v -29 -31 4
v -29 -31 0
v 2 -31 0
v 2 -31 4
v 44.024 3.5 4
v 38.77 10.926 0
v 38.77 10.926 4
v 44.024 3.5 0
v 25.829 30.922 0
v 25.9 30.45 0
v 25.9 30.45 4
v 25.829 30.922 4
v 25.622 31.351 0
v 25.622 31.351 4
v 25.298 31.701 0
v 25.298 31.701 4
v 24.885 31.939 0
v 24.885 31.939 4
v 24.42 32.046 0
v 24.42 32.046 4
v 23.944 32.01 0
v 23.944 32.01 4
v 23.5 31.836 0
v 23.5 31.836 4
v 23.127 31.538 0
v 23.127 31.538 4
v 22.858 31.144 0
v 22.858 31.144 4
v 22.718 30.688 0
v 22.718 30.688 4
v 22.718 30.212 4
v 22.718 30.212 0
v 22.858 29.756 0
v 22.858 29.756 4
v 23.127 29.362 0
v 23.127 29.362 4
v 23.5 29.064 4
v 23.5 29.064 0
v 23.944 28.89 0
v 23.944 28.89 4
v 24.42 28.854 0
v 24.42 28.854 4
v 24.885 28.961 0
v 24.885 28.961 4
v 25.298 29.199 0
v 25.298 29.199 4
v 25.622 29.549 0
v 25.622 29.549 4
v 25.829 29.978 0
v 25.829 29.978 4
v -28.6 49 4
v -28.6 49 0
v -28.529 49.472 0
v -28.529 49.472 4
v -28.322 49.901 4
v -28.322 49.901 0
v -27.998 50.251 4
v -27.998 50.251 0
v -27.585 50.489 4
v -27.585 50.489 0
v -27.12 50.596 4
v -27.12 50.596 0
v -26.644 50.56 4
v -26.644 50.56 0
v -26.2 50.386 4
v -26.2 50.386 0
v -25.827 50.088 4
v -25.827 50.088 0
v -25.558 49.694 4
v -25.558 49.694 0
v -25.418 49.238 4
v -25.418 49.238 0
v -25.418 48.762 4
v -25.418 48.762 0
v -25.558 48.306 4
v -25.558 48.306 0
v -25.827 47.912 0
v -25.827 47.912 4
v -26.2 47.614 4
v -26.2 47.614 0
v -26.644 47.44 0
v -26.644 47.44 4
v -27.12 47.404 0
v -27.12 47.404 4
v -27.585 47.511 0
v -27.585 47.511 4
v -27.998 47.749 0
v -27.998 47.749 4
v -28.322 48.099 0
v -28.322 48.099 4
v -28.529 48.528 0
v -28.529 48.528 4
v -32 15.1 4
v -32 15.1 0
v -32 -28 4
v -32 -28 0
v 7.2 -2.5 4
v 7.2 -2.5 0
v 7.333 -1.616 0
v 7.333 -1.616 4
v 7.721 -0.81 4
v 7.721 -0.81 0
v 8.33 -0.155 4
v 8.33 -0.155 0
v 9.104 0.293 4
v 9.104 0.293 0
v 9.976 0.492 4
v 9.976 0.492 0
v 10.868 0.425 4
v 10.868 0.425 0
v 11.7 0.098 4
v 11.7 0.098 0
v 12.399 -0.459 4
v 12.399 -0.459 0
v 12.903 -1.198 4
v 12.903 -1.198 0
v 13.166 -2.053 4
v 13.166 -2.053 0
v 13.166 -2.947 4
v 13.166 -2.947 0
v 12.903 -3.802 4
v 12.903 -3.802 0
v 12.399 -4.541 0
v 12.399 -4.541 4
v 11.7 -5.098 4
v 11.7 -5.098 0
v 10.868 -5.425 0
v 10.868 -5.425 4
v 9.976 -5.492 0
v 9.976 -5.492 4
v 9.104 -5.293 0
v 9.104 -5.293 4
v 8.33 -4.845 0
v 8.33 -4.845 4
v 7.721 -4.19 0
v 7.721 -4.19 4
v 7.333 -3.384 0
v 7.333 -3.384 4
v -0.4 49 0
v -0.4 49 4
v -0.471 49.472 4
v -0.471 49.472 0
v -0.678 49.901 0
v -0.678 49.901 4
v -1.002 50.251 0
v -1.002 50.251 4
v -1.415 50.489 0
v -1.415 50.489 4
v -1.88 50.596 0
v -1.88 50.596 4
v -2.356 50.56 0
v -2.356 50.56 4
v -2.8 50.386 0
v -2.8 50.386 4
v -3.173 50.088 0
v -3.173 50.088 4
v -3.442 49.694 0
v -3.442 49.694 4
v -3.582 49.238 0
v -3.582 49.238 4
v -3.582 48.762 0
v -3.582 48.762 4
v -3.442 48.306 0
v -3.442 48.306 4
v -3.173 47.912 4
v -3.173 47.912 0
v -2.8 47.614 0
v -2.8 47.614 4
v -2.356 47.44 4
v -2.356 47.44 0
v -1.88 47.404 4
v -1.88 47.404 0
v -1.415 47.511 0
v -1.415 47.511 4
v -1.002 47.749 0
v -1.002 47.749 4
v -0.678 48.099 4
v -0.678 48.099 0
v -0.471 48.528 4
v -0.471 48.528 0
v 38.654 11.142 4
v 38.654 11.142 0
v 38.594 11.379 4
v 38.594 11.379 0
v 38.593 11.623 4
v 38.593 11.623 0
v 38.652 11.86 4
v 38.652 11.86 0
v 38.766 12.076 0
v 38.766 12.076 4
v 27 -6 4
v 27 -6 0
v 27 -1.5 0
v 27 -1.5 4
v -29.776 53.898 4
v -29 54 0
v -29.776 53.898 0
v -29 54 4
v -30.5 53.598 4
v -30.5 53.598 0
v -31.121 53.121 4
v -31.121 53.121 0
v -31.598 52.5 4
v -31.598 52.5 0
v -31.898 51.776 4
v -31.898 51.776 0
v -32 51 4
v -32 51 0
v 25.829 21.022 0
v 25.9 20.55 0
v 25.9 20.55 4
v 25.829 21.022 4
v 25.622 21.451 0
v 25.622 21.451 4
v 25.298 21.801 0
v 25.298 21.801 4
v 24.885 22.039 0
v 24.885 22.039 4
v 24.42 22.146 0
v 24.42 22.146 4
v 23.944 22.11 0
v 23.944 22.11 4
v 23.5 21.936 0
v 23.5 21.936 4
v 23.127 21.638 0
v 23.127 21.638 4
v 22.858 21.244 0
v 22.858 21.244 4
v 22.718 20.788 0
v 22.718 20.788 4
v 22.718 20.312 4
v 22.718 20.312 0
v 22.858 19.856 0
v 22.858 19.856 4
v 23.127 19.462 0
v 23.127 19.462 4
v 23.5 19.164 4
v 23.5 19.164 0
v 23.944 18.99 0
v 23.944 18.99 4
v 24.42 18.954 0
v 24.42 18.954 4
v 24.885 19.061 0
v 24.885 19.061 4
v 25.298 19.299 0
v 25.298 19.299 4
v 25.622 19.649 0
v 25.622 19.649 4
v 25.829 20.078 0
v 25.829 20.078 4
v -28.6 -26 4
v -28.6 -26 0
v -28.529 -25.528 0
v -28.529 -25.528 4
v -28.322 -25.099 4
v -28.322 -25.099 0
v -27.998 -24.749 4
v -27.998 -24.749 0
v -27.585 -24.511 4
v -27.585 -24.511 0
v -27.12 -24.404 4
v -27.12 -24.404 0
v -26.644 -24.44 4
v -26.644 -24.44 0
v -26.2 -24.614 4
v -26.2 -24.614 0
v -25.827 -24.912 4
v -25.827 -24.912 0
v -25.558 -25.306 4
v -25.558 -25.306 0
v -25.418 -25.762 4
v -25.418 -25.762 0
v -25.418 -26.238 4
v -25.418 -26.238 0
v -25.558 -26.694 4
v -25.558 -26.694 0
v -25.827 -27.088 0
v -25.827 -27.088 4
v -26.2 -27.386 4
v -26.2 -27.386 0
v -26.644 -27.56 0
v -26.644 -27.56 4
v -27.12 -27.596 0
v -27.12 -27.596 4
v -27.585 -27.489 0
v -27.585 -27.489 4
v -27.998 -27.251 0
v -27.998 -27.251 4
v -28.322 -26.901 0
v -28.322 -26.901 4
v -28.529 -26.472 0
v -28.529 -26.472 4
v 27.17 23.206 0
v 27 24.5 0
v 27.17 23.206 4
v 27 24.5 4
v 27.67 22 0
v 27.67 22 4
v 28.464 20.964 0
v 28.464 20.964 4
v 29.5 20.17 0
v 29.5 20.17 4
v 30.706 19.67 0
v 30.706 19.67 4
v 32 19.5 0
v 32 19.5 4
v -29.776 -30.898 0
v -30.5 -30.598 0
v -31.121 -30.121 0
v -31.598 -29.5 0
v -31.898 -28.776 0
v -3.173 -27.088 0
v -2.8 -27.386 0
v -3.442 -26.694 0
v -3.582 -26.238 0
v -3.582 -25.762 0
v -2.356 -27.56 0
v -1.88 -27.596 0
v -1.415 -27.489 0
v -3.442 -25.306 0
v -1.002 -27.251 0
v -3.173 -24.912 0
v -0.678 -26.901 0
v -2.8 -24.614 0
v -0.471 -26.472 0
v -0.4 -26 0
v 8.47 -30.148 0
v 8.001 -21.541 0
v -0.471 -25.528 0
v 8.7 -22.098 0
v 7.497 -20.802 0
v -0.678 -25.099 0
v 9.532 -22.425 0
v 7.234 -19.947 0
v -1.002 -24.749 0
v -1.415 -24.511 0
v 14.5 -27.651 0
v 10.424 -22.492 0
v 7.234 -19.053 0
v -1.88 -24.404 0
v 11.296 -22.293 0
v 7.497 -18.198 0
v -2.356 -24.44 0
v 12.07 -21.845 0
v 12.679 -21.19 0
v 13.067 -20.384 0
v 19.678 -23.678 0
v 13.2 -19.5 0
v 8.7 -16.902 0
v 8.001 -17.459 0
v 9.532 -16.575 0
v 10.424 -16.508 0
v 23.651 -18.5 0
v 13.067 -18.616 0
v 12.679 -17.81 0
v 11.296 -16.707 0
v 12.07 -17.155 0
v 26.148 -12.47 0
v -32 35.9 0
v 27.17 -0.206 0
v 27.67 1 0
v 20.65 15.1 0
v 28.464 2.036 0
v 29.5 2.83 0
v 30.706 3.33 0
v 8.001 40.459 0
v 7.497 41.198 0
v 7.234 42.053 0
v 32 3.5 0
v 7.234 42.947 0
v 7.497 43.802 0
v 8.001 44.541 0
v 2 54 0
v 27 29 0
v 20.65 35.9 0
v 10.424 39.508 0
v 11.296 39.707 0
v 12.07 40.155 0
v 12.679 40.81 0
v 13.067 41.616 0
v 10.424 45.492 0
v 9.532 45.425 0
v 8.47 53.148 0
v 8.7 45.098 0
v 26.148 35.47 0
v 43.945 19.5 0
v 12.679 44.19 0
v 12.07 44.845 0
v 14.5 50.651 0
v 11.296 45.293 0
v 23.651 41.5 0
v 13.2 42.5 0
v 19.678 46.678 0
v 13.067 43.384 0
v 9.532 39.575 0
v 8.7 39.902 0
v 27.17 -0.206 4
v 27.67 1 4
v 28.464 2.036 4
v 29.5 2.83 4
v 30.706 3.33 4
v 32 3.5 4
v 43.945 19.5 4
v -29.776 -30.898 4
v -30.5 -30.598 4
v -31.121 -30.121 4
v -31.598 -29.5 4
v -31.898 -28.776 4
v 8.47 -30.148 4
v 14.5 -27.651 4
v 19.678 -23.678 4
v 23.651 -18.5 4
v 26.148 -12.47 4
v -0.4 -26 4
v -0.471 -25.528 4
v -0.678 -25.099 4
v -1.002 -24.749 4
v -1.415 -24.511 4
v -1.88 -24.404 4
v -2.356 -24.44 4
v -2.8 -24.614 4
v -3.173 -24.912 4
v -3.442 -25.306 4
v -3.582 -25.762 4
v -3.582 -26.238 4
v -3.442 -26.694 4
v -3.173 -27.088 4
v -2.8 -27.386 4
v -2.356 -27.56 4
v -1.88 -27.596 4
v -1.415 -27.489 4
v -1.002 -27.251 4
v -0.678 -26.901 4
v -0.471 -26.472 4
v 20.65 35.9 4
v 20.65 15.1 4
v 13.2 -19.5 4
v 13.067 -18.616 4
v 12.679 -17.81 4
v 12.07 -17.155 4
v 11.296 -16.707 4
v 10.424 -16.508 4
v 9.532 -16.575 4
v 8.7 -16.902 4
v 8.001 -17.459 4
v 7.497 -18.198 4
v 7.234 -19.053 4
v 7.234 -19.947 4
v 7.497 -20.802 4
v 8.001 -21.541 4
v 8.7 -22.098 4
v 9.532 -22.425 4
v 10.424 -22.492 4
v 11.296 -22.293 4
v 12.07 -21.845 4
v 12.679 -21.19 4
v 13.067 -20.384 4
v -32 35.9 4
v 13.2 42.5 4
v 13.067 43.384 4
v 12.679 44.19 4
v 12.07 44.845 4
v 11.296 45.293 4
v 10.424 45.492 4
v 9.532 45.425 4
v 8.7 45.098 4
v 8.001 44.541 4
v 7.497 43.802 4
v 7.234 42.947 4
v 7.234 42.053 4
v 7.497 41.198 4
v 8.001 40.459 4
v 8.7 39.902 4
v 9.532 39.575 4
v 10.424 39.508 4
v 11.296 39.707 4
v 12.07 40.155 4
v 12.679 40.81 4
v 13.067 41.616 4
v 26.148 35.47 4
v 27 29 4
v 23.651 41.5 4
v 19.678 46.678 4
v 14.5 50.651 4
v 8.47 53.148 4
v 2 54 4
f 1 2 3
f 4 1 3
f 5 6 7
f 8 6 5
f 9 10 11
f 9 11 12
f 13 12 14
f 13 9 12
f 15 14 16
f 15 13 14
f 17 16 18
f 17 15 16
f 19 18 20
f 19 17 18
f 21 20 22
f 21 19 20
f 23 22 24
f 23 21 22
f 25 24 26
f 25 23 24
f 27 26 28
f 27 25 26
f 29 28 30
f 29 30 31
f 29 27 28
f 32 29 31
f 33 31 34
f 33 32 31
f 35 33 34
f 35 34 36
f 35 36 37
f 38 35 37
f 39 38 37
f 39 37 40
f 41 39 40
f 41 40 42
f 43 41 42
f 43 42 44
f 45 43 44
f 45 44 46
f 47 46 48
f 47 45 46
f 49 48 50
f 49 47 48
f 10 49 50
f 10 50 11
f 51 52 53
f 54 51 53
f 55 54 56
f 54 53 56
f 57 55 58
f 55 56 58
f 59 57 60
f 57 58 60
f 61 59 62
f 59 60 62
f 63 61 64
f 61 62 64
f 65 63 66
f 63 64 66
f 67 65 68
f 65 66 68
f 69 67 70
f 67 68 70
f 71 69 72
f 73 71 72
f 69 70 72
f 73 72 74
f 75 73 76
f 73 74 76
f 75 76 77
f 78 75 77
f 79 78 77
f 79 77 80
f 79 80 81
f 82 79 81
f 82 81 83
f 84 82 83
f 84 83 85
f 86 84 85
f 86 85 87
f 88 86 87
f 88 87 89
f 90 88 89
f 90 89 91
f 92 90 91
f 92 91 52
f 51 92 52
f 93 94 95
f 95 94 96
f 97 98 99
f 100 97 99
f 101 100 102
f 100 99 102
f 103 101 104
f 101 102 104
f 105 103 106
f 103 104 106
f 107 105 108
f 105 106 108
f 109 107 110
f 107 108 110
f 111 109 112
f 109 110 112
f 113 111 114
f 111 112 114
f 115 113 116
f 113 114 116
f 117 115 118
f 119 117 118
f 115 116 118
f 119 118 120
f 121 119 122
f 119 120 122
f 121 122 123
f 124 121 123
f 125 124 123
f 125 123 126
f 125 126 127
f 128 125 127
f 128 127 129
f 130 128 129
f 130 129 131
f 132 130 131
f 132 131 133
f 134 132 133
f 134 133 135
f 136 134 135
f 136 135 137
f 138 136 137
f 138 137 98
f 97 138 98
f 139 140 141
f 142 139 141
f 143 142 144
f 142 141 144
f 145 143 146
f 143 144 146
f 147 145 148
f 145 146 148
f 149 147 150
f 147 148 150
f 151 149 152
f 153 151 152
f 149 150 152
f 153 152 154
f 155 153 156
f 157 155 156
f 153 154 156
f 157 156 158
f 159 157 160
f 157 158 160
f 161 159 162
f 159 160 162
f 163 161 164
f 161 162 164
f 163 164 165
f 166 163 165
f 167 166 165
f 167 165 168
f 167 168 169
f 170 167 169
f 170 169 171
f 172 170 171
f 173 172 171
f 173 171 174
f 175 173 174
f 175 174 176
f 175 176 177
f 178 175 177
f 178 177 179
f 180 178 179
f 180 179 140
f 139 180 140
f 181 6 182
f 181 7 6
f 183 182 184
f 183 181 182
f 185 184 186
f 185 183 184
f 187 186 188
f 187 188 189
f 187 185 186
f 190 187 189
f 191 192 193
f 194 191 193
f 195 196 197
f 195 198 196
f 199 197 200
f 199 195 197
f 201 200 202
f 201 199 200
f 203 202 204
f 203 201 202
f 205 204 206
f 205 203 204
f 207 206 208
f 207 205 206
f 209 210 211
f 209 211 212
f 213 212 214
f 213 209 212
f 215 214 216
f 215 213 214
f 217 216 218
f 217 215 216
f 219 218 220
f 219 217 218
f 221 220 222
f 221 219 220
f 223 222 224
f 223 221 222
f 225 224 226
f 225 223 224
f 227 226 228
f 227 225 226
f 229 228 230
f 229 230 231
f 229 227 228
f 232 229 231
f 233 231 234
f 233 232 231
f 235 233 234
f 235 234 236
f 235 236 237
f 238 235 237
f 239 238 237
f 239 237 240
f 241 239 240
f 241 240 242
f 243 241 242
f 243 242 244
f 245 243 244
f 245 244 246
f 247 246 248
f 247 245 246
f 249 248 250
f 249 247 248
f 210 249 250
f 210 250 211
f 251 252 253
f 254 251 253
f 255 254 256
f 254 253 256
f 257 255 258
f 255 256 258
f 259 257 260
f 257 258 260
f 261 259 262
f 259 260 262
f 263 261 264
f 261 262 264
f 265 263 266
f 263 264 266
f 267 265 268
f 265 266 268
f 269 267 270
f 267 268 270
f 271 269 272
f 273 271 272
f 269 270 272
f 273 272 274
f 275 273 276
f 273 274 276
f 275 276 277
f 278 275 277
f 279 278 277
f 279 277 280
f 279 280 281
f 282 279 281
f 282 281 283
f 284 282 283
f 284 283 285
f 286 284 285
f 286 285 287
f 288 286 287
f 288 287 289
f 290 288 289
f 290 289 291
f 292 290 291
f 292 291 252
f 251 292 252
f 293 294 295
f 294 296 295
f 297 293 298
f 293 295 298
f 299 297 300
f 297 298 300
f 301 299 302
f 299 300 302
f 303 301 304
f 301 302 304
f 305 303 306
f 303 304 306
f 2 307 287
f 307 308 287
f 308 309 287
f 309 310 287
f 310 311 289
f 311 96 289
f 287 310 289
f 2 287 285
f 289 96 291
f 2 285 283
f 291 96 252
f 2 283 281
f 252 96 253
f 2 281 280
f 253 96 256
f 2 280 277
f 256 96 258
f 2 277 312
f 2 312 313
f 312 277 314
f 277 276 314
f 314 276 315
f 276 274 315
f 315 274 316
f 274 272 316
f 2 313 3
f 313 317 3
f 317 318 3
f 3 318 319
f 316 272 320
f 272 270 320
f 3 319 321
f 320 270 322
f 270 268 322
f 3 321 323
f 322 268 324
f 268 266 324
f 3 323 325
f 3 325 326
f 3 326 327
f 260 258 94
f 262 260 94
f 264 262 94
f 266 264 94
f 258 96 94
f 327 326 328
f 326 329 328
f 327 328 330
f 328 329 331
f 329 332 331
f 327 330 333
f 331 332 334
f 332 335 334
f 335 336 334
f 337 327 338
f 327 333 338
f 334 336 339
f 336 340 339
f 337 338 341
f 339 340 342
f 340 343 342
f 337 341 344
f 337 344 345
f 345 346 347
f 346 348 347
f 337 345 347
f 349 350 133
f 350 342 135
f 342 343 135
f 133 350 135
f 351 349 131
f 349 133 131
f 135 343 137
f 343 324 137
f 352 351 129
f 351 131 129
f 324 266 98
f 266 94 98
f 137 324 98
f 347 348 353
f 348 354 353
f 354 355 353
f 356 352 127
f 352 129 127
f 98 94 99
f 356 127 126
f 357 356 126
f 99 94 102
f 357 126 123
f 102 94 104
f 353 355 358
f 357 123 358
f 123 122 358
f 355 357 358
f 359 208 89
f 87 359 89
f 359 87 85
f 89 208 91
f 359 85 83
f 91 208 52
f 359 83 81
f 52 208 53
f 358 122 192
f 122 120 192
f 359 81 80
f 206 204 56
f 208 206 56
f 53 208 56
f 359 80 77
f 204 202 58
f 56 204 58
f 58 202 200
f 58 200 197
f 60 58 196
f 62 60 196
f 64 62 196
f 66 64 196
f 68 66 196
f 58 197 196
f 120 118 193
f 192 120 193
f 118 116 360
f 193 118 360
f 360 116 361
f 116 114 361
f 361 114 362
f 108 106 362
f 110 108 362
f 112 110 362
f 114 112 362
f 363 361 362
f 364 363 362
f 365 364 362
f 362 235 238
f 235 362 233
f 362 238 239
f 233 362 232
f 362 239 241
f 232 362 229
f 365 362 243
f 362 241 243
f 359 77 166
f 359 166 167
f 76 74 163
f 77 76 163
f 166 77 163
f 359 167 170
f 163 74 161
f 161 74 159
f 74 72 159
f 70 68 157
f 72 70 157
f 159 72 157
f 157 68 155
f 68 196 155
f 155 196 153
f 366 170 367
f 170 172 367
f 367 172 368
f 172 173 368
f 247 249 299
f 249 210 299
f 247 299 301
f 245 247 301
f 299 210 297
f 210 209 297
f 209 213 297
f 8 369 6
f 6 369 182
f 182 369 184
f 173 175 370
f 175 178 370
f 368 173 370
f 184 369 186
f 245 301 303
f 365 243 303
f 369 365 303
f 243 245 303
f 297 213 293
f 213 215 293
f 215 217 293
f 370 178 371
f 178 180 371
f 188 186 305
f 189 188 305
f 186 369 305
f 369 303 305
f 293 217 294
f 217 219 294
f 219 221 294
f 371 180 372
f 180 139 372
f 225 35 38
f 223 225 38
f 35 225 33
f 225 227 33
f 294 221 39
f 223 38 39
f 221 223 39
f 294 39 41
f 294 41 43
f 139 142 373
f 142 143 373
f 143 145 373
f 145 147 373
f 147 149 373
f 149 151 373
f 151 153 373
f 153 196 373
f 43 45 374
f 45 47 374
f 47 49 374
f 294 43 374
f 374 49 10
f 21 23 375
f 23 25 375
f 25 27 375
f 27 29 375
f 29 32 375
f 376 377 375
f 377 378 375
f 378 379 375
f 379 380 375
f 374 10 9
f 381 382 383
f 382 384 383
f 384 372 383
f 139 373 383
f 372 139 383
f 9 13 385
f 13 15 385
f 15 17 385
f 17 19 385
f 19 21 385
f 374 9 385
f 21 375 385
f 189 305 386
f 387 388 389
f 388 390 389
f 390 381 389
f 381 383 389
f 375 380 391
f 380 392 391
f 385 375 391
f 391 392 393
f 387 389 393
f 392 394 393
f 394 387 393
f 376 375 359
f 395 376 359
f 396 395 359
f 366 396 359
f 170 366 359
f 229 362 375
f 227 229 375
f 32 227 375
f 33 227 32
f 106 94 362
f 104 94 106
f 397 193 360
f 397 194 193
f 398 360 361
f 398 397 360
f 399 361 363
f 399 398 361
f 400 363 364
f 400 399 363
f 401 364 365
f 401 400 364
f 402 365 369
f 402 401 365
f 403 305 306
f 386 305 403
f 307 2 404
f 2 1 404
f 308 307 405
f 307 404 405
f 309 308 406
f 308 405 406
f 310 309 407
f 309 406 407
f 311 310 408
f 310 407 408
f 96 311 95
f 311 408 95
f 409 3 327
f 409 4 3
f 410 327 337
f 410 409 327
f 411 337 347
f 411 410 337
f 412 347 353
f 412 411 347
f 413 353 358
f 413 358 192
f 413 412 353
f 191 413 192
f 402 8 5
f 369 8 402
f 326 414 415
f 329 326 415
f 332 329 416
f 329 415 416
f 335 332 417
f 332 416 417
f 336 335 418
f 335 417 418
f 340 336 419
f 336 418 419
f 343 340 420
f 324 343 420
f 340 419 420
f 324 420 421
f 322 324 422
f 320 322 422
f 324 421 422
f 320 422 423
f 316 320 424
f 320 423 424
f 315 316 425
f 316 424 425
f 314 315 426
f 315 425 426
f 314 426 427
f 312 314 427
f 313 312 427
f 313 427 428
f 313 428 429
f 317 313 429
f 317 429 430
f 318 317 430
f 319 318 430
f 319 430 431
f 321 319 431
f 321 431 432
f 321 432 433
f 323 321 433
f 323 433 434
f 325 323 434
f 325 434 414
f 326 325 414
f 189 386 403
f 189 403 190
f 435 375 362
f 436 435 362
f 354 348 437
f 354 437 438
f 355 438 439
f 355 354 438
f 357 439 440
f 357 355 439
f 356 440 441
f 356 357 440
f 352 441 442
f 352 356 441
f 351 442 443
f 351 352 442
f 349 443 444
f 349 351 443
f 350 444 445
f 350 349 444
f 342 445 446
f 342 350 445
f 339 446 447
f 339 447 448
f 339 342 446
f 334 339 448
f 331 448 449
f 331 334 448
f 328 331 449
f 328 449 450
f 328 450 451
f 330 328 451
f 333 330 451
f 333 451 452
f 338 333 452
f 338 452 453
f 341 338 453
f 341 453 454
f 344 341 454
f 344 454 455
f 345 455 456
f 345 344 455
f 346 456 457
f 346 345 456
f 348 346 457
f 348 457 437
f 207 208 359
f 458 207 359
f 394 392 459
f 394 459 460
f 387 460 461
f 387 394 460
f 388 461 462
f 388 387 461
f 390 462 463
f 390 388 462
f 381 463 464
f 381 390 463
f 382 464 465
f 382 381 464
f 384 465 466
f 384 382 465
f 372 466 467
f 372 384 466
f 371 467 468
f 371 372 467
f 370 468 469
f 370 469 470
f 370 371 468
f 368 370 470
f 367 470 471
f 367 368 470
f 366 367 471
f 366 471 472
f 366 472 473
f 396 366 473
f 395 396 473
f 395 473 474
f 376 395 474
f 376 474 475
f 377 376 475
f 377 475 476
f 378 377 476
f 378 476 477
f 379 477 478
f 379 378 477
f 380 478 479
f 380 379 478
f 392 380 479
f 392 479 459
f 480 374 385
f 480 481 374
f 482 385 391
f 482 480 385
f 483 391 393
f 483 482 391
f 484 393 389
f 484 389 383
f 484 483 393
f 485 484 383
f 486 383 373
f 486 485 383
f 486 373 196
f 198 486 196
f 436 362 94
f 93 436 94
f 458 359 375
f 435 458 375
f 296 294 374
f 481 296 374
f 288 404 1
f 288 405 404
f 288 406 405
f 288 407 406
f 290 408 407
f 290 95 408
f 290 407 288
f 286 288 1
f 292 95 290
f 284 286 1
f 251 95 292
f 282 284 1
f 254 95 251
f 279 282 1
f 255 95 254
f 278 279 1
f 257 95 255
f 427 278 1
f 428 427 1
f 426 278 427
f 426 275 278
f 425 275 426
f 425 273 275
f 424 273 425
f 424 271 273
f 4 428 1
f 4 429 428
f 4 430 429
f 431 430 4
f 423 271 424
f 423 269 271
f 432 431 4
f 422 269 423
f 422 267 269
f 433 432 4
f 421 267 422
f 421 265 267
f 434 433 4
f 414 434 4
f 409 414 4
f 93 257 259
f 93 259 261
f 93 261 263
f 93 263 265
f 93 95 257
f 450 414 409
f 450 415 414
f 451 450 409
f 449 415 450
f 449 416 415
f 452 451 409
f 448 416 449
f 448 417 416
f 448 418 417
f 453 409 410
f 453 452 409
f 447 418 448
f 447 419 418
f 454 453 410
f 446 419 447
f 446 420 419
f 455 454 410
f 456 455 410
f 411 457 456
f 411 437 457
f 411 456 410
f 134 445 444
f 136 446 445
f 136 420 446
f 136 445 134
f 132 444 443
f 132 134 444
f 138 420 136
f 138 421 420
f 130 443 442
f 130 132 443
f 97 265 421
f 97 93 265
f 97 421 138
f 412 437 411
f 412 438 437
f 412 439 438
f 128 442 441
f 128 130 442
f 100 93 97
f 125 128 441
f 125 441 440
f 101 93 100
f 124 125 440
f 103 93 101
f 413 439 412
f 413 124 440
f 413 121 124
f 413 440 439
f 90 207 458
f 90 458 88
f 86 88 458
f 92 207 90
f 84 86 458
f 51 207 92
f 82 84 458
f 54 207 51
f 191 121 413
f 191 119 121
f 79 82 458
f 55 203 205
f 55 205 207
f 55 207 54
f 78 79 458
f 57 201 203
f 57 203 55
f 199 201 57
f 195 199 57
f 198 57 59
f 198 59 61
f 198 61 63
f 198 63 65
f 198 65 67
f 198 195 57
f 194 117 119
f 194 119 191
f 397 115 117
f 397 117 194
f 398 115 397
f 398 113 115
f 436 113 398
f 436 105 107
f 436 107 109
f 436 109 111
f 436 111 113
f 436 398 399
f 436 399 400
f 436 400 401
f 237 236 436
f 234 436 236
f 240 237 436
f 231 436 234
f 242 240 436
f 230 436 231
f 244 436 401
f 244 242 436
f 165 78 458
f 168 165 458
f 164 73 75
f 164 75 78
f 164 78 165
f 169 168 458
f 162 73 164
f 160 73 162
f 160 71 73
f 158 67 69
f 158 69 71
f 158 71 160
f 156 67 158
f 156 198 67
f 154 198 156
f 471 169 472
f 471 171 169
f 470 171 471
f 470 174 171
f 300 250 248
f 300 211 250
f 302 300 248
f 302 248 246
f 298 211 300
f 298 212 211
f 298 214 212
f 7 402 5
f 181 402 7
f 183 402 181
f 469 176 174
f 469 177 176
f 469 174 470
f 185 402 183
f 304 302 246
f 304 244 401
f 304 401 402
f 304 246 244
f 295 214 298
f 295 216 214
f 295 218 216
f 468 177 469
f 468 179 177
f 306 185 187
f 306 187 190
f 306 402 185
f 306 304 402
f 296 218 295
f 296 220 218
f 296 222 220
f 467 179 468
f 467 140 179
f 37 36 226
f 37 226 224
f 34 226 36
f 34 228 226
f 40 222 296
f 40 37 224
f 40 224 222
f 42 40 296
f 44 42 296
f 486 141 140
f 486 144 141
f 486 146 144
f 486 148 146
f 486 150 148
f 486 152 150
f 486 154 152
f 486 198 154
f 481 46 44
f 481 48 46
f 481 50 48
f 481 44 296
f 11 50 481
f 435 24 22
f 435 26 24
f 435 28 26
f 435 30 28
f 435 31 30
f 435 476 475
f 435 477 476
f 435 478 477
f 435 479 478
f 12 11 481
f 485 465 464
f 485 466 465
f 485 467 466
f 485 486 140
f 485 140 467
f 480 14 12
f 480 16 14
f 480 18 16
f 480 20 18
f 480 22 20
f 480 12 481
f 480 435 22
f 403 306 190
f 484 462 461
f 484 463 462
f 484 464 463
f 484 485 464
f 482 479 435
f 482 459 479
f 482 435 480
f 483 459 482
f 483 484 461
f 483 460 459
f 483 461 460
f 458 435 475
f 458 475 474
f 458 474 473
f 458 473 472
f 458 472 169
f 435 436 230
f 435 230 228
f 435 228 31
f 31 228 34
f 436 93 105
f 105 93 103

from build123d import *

# Parameters (mm, degrees)
SKETCH_1_R          = 3
SKETCH_1_R_2        = 1.6
EXTRUDE_1_DEPTH     = 4
FILLET_1_R          = 3
FILLET_2_R          = 25
SKETCH_2_R          = 1.6
CUT_EXTRUDE_1_DEPTH = 10
SKETCH_3_R          = 3
CUT_EXTRUDE_2_DEPTH = 10
EXTRUDE_2_DEPTH     = 4
FILLET_3_R          = 5
FILLET_4_R          = 1
SKETCH_5_R          = 1.6
CUT_EXTRUDE_3_DEPTH = 10


with BuildPart() as part:
    # ｽｹｯﾁ1 → ﾎﾞｽ - 押し出し1 (new body)
    with BuildSketch(Plane.XY):
        Polygon((-32, -10.4), (-32, -31), (27, -31), (27, 54), (-32, 54), (-32, 35.9), (20.65, 35.9), (20.65, 15.1), (-32, 15.1), (-32, 10.4), align=None)
        with Locations((10.2, -19.5)):
            Circle(SKETCH_1_R, mode=Mode.SUBTRACT)
        with Locations((24.3, 20.55)):
            Circle(SKETCH_1_R_2, mode=Mode.SUBTRACT)
        with Locations((24.3, 30.45)):
            Circle(SKETCH_1_R_2, mode=Mode.SUBTRACT)
        with Locations((10.2, 42.5)):
            Circle(SKETCH_1_R, mode=Mode.SUBTRACT)
    extrude(amount=EXTRUDE_1_DEPTH)

    # ﾌｨﾚｯﾄ1
    fillet_1_edges = [part.edges().sort_by_distance(p)[0] for p in [
        (-32, 54, 2),
        (-32, -31, 2),
    ]]
    fillet(fillet_1_edges, radius=FILLET_1_R)

    # ﾌｨﾚｯﾄ2
    fillet_2_edges = [part.edges().sort_by_distance(p)[0] for p in [
        (27, 54, 2),
        (27, -31, 2),
    ]]
    fillet(fillet_2_edges, radius=FILLET_2_R)

    # ｽｹｯﾁ2 → ｶｯﾄ - 押し出し1 (cut)
    with BuildSketch(Plane(origin=(0, 0, 0), x_dir=(-1, 0, 0), z_dir=(0, 0, -1))):
        with Locations((27, 49)):
            Circle(SKETCH_2_R)
        with Locations((27, -26)):
            Circle(SKETCH_2_R)
    extrude(amount=-CUT_EXTRUDE_1_DEPTH, mode=Mode.SUBTRACT)

    # ｽｹｯﾁ3 → ｶｯﾄ - 押し出し2 (cut)
    with BuildSketch(Plane(origin=(0, 0, 0), x_dir=(-1, 0, 0), z_dir=(0, 0, -1))):
        with Locations((-10.2, -2.5)):
            Circle(SKETCH_3_R)
    extrude(amount=-CUT_EXTRUDE_2_DEPTH, mode=Mode.SUBTRACT)

    # ｽｹｯﾁ4 → ﾎﾞｽ - 押し出し2 (add)
    with BuildSketch(Plane(origin=(0, 0, 0), x_dir=(-1, 0, 0), z_dir=(0, 0, -1))):
        Polygon((-27, 19.5), (-43.945270358, 19.5), (-38.364198183, 11.5), (-44.023561215, 3.5), (-27, 3.5), align=None)
    extrude(amount=-EXTRUDE_2_DEPTH)

    # ﾌｨﾚｯﾄ3
    fillet_3_edges = [part.edges().sort_by_distance(p)[0] for p in [
        (27, 19.5, 2),
        (27, 3.5, 2),
    ]]
    fillet(fillet_3_edges, radius=FILLET_3_R)

    # ﾌｨﾚｯﾄ4
    fillet_4_edges = [part.edges().sort_by_distance(p)[0] for p in [
        (38.364198183, 11.5, 2),
    ]]
    fillet(fillet_4_edges, radius=FILLET_4_R)

    # ｽｹｯﾁ5 → ｶｯﾄ - 押し出し3 (cut)
    with BuildSketch(Plane.XY.offset(4)):
        with Locations((-2, -26)):
            Circle(SKETCH_5_R)
        with Locations((-2, 49)):
            Circle(SKETCH_5_R)
    extrude(amount=-CUT_EXTRUDE_3_DEPTH, mode=Mode.SUBTRACT)


solid = part.part
